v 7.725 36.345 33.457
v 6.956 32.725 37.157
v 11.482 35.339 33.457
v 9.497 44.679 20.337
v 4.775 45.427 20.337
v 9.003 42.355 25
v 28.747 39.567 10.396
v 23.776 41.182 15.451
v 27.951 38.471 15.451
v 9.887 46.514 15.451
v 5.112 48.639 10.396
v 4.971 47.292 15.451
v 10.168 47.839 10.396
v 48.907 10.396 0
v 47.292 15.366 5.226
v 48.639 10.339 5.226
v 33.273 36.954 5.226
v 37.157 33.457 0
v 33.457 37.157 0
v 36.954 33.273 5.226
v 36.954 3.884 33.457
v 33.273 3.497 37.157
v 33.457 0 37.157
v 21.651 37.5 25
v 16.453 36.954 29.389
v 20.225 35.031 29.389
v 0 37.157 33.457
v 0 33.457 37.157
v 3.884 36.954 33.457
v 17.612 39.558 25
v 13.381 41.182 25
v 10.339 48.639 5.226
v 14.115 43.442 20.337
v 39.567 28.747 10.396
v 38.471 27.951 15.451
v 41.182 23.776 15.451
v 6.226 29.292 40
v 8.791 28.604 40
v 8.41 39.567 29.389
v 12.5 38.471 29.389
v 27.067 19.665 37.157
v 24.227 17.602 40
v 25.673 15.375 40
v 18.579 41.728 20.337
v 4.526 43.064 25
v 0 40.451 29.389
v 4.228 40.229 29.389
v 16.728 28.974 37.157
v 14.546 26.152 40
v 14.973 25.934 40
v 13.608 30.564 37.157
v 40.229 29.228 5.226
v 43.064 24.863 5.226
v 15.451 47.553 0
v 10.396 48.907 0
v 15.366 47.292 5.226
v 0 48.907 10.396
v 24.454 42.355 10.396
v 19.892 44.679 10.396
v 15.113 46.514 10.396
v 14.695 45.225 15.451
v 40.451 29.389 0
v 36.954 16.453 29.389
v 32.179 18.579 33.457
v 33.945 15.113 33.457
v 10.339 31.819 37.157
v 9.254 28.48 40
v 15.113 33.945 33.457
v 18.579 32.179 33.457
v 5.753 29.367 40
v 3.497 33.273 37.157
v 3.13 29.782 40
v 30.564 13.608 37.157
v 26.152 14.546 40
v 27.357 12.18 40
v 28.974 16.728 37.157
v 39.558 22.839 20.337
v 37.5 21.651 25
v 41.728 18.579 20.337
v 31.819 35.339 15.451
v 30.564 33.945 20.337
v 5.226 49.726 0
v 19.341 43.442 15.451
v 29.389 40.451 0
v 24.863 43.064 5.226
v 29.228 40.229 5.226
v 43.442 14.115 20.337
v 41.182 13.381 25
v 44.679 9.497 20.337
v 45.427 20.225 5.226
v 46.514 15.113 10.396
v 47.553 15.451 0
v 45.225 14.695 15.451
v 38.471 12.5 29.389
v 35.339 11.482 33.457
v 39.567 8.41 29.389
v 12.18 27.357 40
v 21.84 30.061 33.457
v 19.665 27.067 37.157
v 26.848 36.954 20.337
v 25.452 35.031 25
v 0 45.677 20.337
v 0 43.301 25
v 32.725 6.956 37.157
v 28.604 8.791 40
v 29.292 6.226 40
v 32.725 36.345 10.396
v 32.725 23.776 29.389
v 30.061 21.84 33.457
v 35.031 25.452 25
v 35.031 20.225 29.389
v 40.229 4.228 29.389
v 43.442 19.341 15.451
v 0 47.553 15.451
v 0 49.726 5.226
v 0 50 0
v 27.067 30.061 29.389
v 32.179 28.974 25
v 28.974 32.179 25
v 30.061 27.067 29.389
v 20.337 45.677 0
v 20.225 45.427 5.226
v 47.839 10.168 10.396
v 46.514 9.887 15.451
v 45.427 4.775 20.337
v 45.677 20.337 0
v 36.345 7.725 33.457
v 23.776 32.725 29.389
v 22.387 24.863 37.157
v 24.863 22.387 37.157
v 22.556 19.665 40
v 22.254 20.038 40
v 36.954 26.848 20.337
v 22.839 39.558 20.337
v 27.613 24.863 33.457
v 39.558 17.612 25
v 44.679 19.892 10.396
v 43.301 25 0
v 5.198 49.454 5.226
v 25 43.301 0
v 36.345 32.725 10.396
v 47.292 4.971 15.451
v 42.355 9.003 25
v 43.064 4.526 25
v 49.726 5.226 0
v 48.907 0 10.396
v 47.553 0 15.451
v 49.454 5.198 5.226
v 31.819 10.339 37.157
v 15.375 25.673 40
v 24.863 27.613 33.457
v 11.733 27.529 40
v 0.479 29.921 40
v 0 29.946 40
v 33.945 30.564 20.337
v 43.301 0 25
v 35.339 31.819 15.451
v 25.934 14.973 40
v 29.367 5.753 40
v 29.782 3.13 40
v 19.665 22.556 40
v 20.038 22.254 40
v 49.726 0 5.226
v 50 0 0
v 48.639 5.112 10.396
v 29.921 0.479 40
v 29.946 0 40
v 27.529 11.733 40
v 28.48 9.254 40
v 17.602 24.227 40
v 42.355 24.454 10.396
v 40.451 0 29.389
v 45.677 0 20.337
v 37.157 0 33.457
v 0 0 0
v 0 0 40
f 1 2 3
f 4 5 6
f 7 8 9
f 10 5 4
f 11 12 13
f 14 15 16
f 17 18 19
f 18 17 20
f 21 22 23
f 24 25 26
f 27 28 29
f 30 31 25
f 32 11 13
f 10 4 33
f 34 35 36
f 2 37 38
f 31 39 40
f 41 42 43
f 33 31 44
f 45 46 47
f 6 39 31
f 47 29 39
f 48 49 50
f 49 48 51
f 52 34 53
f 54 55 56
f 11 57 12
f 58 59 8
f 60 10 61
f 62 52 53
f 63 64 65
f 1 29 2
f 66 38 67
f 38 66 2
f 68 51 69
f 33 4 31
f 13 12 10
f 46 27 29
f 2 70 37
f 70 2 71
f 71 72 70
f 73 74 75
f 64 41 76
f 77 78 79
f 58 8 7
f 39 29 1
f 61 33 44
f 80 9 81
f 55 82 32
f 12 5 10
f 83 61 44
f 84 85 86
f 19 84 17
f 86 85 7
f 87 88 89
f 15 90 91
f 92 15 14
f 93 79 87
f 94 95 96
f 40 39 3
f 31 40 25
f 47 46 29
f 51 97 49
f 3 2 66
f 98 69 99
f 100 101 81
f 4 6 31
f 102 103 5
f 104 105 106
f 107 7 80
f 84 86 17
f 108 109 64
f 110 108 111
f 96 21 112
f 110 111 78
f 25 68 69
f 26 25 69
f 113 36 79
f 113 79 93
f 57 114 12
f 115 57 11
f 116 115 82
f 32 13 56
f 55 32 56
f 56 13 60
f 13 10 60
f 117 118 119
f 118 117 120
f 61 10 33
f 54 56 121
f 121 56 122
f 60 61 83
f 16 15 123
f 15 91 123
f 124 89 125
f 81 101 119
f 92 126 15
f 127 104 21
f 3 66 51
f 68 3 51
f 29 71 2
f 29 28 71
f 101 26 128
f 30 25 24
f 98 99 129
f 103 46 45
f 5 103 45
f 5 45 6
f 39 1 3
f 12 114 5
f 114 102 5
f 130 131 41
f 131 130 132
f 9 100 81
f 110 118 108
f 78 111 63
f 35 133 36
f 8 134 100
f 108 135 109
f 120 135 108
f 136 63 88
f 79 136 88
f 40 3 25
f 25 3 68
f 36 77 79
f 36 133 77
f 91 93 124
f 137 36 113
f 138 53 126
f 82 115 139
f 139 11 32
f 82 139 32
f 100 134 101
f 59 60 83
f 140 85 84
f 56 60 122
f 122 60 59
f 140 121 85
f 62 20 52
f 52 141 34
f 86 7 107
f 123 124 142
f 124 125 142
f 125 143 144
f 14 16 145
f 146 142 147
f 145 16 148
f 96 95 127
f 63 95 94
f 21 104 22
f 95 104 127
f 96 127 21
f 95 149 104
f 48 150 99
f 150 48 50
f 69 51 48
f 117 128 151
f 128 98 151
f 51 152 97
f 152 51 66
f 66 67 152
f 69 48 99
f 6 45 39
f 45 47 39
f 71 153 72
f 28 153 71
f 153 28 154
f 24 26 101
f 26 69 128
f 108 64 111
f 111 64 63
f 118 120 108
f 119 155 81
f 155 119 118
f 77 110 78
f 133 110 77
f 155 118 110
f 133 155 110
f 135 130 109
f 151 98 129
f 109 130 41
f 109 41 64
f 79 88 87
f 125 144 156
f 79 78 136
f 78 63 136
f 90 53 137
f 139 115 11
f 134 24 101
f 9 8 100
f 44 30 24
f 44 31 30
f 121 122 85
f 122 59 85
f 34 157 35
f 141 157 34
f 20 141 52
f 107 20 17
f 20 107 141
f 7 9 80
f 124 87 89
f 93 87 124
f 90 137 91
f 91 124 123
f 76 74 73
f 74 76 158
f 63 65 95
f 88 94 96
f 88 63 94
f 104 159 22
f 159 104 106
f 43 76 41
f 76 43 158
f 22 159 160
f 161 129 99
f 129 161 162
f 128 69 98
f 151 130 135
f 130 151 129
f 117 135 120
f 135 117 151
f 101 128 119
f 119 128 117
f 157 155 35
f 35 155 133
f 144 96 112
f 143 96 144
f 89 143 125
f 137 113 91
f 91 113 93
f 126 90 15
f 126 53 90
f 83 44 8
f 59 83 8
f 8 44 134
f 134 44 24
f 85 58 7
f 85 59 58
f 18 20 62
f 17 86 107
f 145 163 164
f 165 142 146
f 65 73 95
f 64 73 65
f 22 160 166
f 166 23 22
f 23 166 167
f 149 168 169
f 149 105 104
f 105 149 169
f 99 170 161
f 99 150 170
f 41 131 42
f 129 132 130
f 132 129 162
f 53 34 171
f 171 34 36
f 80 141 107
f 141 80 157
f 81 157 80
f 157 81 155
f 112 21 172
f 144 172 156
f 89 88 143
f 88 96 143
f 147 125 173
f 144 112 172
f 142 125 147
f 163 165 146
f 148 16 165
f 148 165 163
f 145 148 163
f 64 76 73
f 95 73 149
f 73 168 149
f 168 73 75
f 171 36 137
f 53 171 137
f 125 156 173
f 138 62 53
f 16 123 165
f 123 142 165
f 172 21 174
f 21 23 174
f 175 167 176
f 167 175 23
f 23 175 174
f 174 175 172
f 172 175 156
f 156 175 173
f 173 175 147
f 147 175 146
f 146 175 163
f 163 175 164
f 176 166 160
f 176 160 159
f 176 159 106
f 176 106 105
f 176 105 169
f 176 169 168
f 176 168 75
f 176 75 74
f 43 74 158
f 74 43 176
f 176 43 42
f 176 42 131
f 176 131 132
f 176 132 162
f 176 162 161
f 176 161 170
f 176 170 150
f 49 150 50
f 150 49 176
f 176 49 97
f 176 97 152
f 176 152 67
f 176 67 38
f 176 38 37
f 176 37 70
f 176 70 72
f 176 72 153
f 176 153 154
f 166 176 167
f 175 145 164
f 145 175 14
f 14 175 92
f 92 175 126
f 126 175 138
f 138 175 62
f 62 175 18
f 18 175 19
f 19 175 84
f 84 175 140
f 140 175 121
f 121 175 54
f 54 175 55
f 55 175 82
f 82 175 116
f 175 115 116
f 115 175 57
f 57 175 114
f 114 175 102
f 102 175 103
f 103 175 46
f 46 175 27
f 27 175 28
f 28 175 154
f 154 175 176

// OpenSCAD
// file: ../utils/core/clip.scad
//
// NopSCADlib Copyright Chris Palmer 2018
// nop.head@gmail.com
// hydraraptor.blogspot.com
//
// This file is part of NopSCADlib.
//
// NopSCADlib is free software: you can redistribute it and/or modify it under the terms of the
// GNU General Public License as published by the Free Software Foundation, either version 3 of
// the License, or (at your option) any later version.
//
// NopSCADlib is distributed in the hope that it will be useful, but WITHOUT ANY WARRANTY;
// without even the implied warranty of MERCHANTABILITY or FITNESS FOR A PARTICULAR PURPOSE.
// See the GNU General Public License for more details.
//
// You should have received a copy of the GNU General Public License along with NopSCADlib.
// If not, see <https://www.gnu.org/licenses/>.
//

//
//! Construct arbirarily large box to partition 3D space and clip objects, useful for creating cross sections to see the inside when debugging.
//!
//! Original version by Doug Moen on the OpenSCAD forum
//
//
module box(xmin, ymin, zmin, xmax, ymax, zmax) //! Construct a box given its bounds
    polyhedron(
        [[xmin, ymin, zmin],  // 0
         [xmin, ymin, zmax],  // 1
         [xmin, ymax, zmin],  // 2
         [xmin, ymax, zmax],  // 3
         [xmax, ymin, zmin],  // 4
         [xmax, ymin, zmax],  // 5
         [xmax, ymax, zmin],  // 6
         [xmax, ymax, zmax]], // 7
        [[7,5,1,3],  // top
         [2,0,4,6],  // bottom
         [5,4,0,1],  // front
         [3,2,6,7],  // back
         [5,7,6,4],  // right
         [0,2,3,1]]  // left
    );

module clip(xmin = -inf, ymin = -inf, zmin = -inf, xmax = inf, ymax = inf, zmax = inf) //! Clip child to specified boundaries
    render() intersection() {
        children();

        box(xmin, ymin, zmin, xmax, ymax, zmax);
    }
// file: ../utils/core/rounded_rectangle.scad
//
// NopSCADlib Copyright Chris Palmer 2018
// nop.head@gmail.com
// hydraraptor.blogspot.com
//
// This file is part of NopSCADlib.
//
// NopSCADlib is free software: you can redistribute it and/or modify it under the terms of the
// GNU General Public License as published by the Free Software Foundation, either version 3 of
// the License, or (at your option) any later version.
//
// NopSCADlib is distributed in the hope that it will be useful, but WITHOUT ANY WARRANTY;
// without even the implied warranty of MERCHANTABILITY or FITNESS FOR A PARTICULAR PURPOSE.
// See the GNU General Public License for more details.
//
// You should have received a copy of the GNU General Public License along with NopSCADlib.
// If not, see <https://www.gnu.org/licenses/>.
//

//
//! Rectangle with rounded corners.
//
module rounded_square(size, r, center = true) //! Like ```square()``` but with with rounded corners
{
    $fn = r2sides4n(r);
    offset(r) offset(-r) square(size, center = center);
}

module rounded_rectangle(size, r, center = true, xy_center = true) //! Like ```cube()``` but corners rounded in XY plane and separate centre options for xy and z.
{
    linear_extrude(height = size[2], center = center)
        rounded_square([size[0], size[1]], r, xy_center);
}
// file: ../utils/core/teardrops.scad
//
// NopSCADlib Copyright Chris Palmer 2018
// nop.head@gmail.com
// hydraraptor.blogspot.com
//
// This file is part of NopSCADlib.
//
// NopSCADlib is free software: you can redistribute it and/or modify it under the terms of the
// GNU General Public License as published by the Free Software Foundation, either version 3 of
// the License, or (at your option) any later version.
//
// NopSCADlib is distributed in the hope that it will be useful, but WITHOUT ANY WARRANTY;
// without even the implied warranty of MERCHANTABILITY or FITNESS FOR A PARTICULAR PURPOSE.
// See the GNU General Public License for more details.
//
// You should have received a copy of the GNU General Public License along with NopSCADlib.
// If not, see <https://www.gnu.org/licenses/>.
//

//
//! For making horizontal holes that don't need support material.
//! Small holes can get away without it, but they print better with truncated teardrops.
//
module teardrop(h, r, center = true, truncate = true) //! For making horizontal holes that don't need support material, set ```truncate = false``` to make traditional RepRap teardrops that don't even need bridging
    render(convexity = 5)
        extrude_if(h, center)
           hull() {
                circle4n(r);

                if(truncate)
                    translate([0, r / 2])
                        square([2 * r * (sqrt(2) - 1), r], center = true);
                else
                    polygon([[0, 0], [eps, 0], [0, r * sqrt(2)]]);
            }

module teardrop_plus(h, r, center = true, truncate = true) //! Slightly bigger teardrop to allow for the 3D printing staircase effect
    teardrop(h, r + layer_height / 4, center, truncate);

module tearslot(h, r, w, center = true) //! A horizontal slot that doesn't need support material
    extrude_if(h, center)
        hull() {
            translate([-w/2,0,0]) teardrop(r = r, h = 0);
            translate([ w/2,0,0]) teardrop(r = r, h = 0);
        }

module vertical_tearslot(h, r, l, center = true) //! A vertical slot that doesn't need support material
    extrude_if(h, center)
        hull() {
            translate([0,  l / 2]) teardrop(0, r, true);
            translate([0, -l / 2])
                circle4n(r);
        }
// file: ../utils/core/polyholes.scad
//
// NopSCADlib Copyright Chris Palmer 2018
// nop.head@gmail.com
// hydraraptor.blogspot.com
//
// This file is part of NopSCADlib.
//
// NopSCADlib is free software: you can redistribute it and/or modify it under the terms of the
// GNU General Public License as published by the Free Software Foundation, either version 3 of
// the License, or (at your option) any later version.
//
// NopSCADlib is distributed in the hope that it will be useful, but WITHOUT ANY WARRANTY;
// without even the implied warranty of MERCHANTABILITY or FITNESS FOR A PARTICULAR PURPOSE.
// See the GNU General Public License for more details.
//
// You should have received a copy of the GNU General Public License along with NopSCADlib.
// If not, see <https://www.gnu.org/licenses/>.
//

//
//! A method of making 3D printed holes come out the right size regardless of the printer, providing
//! it gets the linear dimensions right. See <https://hydraraptor.blogspot.com/2011/02/polyholes.html>
//!
//! The module provides `poly_circle()`, `poly_cylinder()` and `poly_ring()` that is useful for making printed washers and pillars.
//
function sides(r) = max(round(4 * r), 3); //! Optimium number of sides for specified radius
function corrected_radius(r, n = 0)   = r / cos(180 / (n ? n : sides(r))); //! Adjusted radius to make flats lie on the circle
function corrected_diameter(d, n = 0) = d / cos(180 / (n ? n : sides(d / 2))); //! Adjusted diameter to make flats lie on the circle

module poly_circle(r, sides = 0) { //! Make a circle adjusted to print the correct size
    n = sides ? sides : sides(r);
    circle(r = corrected_radius(r,n), $fn = n);
}

module poly_cylinder(r, h, center = false, sides = 0) //! Make a cylinder adjusted to print the correct size
    extrude_if(h, center)
        poly_circle(r, sides);

module poly_ring(or, ir) { //! Make a 2D ring adjusted to have the correct internal radius
    cir = corrected_radius(ir);
    filaments = floor((or - cir) / extrusion_width);
    if(filaments > 3)
        difference() {
            circle(or);

            poly_circle(ir);
        }
    else
        if(filaments >= 2)
            difference() {
                offset(or - cir)
                    poly_circle(ir);

                poly_circle(ir);
            }
            else
                difference() {
                    poly_circle(or);

                    offset(-squeezed_wall)
                        poly_circle(or);
                }
}

module drill(r, h = 100) //! Make a cylinder for drilling holes suitable for CNC routing, set h = 0 for circle
    extrude_if(h)
        circle(r = corrected_radius(r, r2sides(r)));
//
// Horizontal slot
//
module slot(r, l, h = 100) //! Make a horizontal slot suitable for CNC routing, set h = 0 for 2D version
    extrude_if(h)
        hull() {
            translate([l / 2,0])
                drill(r, 0);

            translate([-l / 2,0])
                drill(r, 0);
        }
// file: ../utils/core/bom.scad
//
// NopSCADlib Copyright Chris Palmer 2018
// nop.head@gmail.com
// hydraraptor.blogspot.com
//
// This file is part of NopSCADlib.
//
// NopSCADlib is free software: you can redistribute it and/or modify it under the terms of the
// GNU General Public License as published by the Free Software Foundation, either version 3 of
// the License, or (at your option) any later version.
//
// NopSCADlib is distributed in the hope that it will be useful, but WITHOUT ANY WARRANTY;
// without even the implied warranty of MERCHANTABILITY or FITNESS FOR A PARTICULAR PURPOSE.
// See the GNU General Public License for more details.
//
// You should have received a copy of the GNU General Public License along with NopSCADlib.
// If not, see <https://www.gnu.org/licenses/>.
//

//
//! Bill Of Materials generation via echo and the ```bom.py``` script. Also handles exploded assembly views and posing. Assembly instructions can precede the module
//! definition that makes the assembly.
//!
//! The example below shows how to define a vitamin and incorporate it into an assembly with sub-assemblies and make an exploded view. The resulting flat BOM is shown but
//! heirachical BOMs are also generated for real projects.
//
function bom_mode(n = 1) = $_bom >= n && (is_undef($on_bom) || $on_bom);  //! Current BOM mode, 0 = none, 1 = printed and routed parts and assemblies, 2 includes vitamins as well
function exploded() = is_undef($exploded_parent) ? $exploded : 0;   //! Returns the value of ```$exploded``` if it is defined, else ```0```
function show_supports() = !$preview || exploded();                 //! True if printed support material should be shown

module no_explode() let($exploded_parent = true) children();        //! Prevent children being exploded
module no_pose() let($posed = true) children();                     //! Force children not to be posed even if parent is

module explode(d, explode_children = false, offset = [0,0,0]) {     //! Explode children by specified Z distance or vector ```d```, option to explode grand children
    v = is_list(d) ? d : [0, 0, d];
    o = is_list(offset) ? offset : [0, 0, offset];
    if($exploded && is_undef($exploded_parent)) {
        translate(o)                                                // Draw the line first in case the child is transparent
            hull() {
                sphere(0.2);

                translate(v * $exploded)
                    sphere(0.2);
            }

        translate(v * $exploded)
            let($exploded_parent = explode_children ? undef : true)
                children();
    }
    else
        children();
}

module pose(a = [55, 0, 25], t = [0, 0, 0], exploded = undef)       //! Pose an STL or assembly for rendering to png by specifying rotation ```a``` and translation ```t```, ```exploded = true for``` just the exploded view or ```false``` for unexploded only.
    if(is_undef($pose) || !is_undef($posed) || (!is_undef(exploded) && exploded != !!exploded()))
        children();
    else
        let($posed = true) // only pose the top level
            rotate([55, 0, 25])
                rotate([-a.x, 0, 0])
                    rotate([0, -a.y, 0])
                        rotate([0, 0, -a.z])
                            translate(-t)
                                children();


module assembly(name) {                 //! Name an assembly that will appear on the BOM, there needs to a module named ```<name>_assembly``` to make it
    if(bom_mode())
        echo(str("~", name, "_assembly{"));

    no_pose()
        if(is_undef($child_assembly))
            let($child_assembly = true)
                children();
        else
            no_explode()
                children();

    if(bom_mode())
        echo(str("~}", name, "_assembly"));
}

module stl(name) {                      //! Name an stl that will appear on the BOM, there needs to a module named ```<name>_stl``` to make it
    if(bom_mode())
        echo(str("~", name, ".stl"));
}

module dxf(name) {                      //! Name a dxf that will appear on the BOM, there needs to a module named ```<name>_dxf``` to make it
    if(bom_mode())
        echo(str("~", name, ".dxf"));
}

function value_string(value) = is_string(value) ? str("\"", value, "\"") : str(value); //! Convert ```value``` to a string or quote it if it is already a string

function arg(value, default, name = "") =   //! Create string for arg if not default, helper for ```vitamin()```
    value == default ? ""
                     : name ? str(", ", name, " = ", value_string(value))
                            : str(", ", value_string(value));

module vitamin(description) {                //! Describe a vitamin for the BOM entry and precede it with a module call that creates it, eg. "wigit(42): Type 42 widget"
    if(bom_mode(2))
        echo(str("~", description, !is_undef($hidden) ? " - not shown" : ""));
}

module not_on_bom(on = false)               //! Specify the following child parts are not on the BOM, for example when they are on a PCB that comes assembled
    let($on_bom = on)
        children();

module hidden()                             //! Make item invisible, except on the BOM
    scale(1 / sqr(1024))
        let($hidden = true)
            children();
// file: ../utils/core/sphere.scad
//
// NopSCADlib Copyright Chris Palmer 2018
// nop.head@gmail.com
// hydraraptor.blogspot.com
//
// This file is part of NopSCADlib.
//
// NopSCADlib is free software: you can redistribute it and/or modify it under the terms of the
// GNU General Public License as published by the Free Software Foundation, either version 3 of
// the License, or (at your option) any later version.
//
// NopSCADlib is distributed in the hope that it will be useful, but WITHOUT ANY WARRANTY;
// without even the implied warranty of MERCHANTABILITY or FITNESS FOR A PARTICULAR PURPOSE.
// See the GNU General Public License for more details.
//
// You should have received a copy of the GNU General Public License along with NopSCADlib.
// If not, see <https://www.gnu.org/licenses/>.
//

//! Redefines `sphere()` to always have a vertex on all six half axes I.e. vertices at the poles and the equator and `$fn` a multiple of four.
//! This ensures `hull` and `minkowski` results have the correct dimensions when spheres are placed at the corners.

module sphere(r = 1, d = undef) {                   //! Override ```sphere``` so that has vertices on all three axes. Has the advantage of giving correct dimensions when hulled
    R = is_undef(d) ? r : d / 2;
    rotate_extrude($fn = r2sides4n(R))
        rotate(-90)
            semi_circle(R);
}
// file: ../utils/core/global.scad
//
// NopSCADlib Copyright Chris Palmer 2018
// nop.head@gmail.com
// hydraraptor.blogspot.com
//
// This file is part of NopSCADlib.
//
// NopSCADlib is free software: you can redistribute it and/or modify it under the terms of the
// GNU General Public License as published by the Free Software Foundation, either version 3 of
// the License, or (at your option) any later version.
//
// NopSCADlib is distributed in the hope that it will be useful, but WITHOUT ANY WARRANTY;
// without even the implied warranty of MERCHANTABILITY or FITNESS FOR A PARTICULAR PURPOSE.
// See the GNU General Public License for more details.
//
// You should have received a copy of the GNU General Public License along with NopSCADlib.
// If not, see <https://www.gnu.org/licenses/>.
//

//
//! Global constants, functions and modules. This file is used directly or indirectly in every scad file.
//
include <../../global_defs.scad>

function sqr(x) = x * x;                                                            //! Returns the square of ```x```
function inch(x) = x * 25.4;                                                        //! Inch to mm conversion
function echoit(x) = echo(x) x;                                                     //! Echo expression and return it, useful for debugging
function in(list, x) = !!len([for(v = list) if(v == x) true]);                      //! Returns true if ```x``` is an element in the ```list```
function Len(x) = is_list(x) ? len(x) : 0;                                          //! Returns the length of a list or 0 if ```x``` is not a list
function r2sides(r) = $fn ? $fn : ceil(max(min(360/ $fa, r * 2 * PI / $fs), 5));    //! Replicates the OpenSCAD logic to calculate the number of sides from the radius
function r2sides4n(r) = floor((r2sides(r) + 3) / 4) * 4;                            //! Round up the number of sides to a multiple of 4 to ensure points land on all axes

module translate_z(z) translate([0, 0, z]) children();                              //! Shortcut for Z only translations
module vflip() rotate([180, 0, 0]) children();                                      //! Invert children by doing a 180 flip around the X axis
module ellipse(xr, yr) scale([1, yr / xr]) circle4n(xr);                            //! Draw an ellipse

module extrude_if(h, center = true)                 //! Extrudes 2D object to 3D when ```h``` is nonzero, otherwise leaves it 2D
    if(h)
        linear_extrude(height = h, center = center) // 3D
            children();
    else
        children();                                 // 2D

module circle4n(r, d = undef) {                     //! Circle with multiple of 4 vertices
    R = is_undef(d) ? r : d / 2;
    circle(R, $fn = r2sides4n(R));
}

module semi_circle(r, d = undef)                    //! A semi circle in the positive Y domain
    intersection() {
        R = is_undef(d) ? r : d / 2;
        circle4n(R);

        sq = R + 1;
        translate([-sq, 0])
            square([2 * sq, sq]);
    }

include <sphere.scad>
include <bom.scad>
include <polyholes.scad>
include <teardrops.scad>
include <rounded_rectangle.scad>
include <clip.scad>
// file: ../global_defs.scad
//
// NopSCADlib Copyright Chris Palmer 2018
// nop.head@gmail.com
// hydraraptor.blogspot.com
//
// This file is part of NopSCADlib.
//
// NopSCADlib is free software: you can redistribute it and/or modify it under the terms of the
// GNU General Public License as published by the Free Software Foundation, either version 3 of
// the License, or (at your option) any later version.
//
// NopSCADlib is distributed in the hope that it will be useful, but WITHOUT ANY WARRANTY;
// without even the implied warranty of MERCHANTABILITY or FITNESS FOR A PARTICULAR PURPOSE.
// See the GNU General Public License for more details.
//
// You should have received a copy of the GNU General Public License along with NopSCADlib.
// If not, see <https://www.gnu.org/licenses/>.
//

//
// This file included directly or indirectly in every scad file.
//
// This scheme allows the following:
//  bom defaults to 0
//  Setting $bom on the command line or in the main file before including lib.scad overrides it everywhere.
//  Setting $bom after including lib overrides bom in the libs but not in the local file.
//  Setting $_bom in the local file overrides it in the local file but not in the libs.
//
//function is_undef(x) = x == undef;

$_bom           = is_undef($bom)             ? 0      : $bom;             // 0 no bom, 1 assemblies and stls, 2 vitamins as well
$exploded       = is_undef($explode)         ? 0      : $explode;         // 1 for exploded view
layer_height    = is_undef($layer_height)    ? 0.25   : $layer_height;    // layer heigth when printing
extrusion_width = is_undef($extrusion_width) ? 0.5    : $extrusion_width; // filament width when printing
nozzle          = is_undef($nozzle)          ? 0.45   : $nozzle;          // 3D printer nozzle
cnc_bit_r       = is_undef($cnc_bit_r)       ? 1.2    : $cnc_bit_r;       // miniumum tool radius when milling 2D objects
pp1_colour      = is_undef($pp1_colour)      ? "lime" : $pp1_colour;      // printed part colour 1
pp2_colour      = is_undef($pp2_colour)      ? "red"  : $pp2_colour;      // printed part colour 2
pp3_colour      = is_undef($pp3_colour)      ? "blue" : $pp3_colour;      // printed part colour 3
pp4_colour      = is_undef($pp4_colour)      ? "darkorange" : $pp4_colour;// printed part colour 4
show_rays       = is_undef($show_rays)       ? false  : $show_rays;       // show camera sight lines and light direction

// Minimum wall is about two filaments wide but we extrude it closer to get better bonding
squeezed_wall = $preview ? 2 * extrusion_width - layer_height * (1 - PI / 4)
                         : extrusion_width - layer_height / 2 + nozzle / 2 + extrusion_width / 2;

inf = 1e10;      // very big
eps = 1/128;     // small fudge factor to stop CSG barfing on coincident faces.
$fa = 6;
$fs = extrusion_width / 2;

function round_to_layer(z) = ceil(z / layer_height) * layer_height;
// Some additional named colors
grey20                          = [0.2, 0.2, 0.2];
grey30                          = [0.3, 0.3, 0.3];
grey40                          = [0.4, 0.4, 0.4];
grey50                          = [0.5, 0.5, 0.5];
grey60                          = [0.6, 0.6, 0.6];
grey70                          = [0.7, 0.7, 0.7];
grey80                          = [0.8, 0.8, 0.8];
grey90                          = [0.9, 0.9, 0.9];
brass                           = "gold";

/*
 * Enums
 */
//
// Screws
//
hs_cap    = 0;
hs_pan    = 1;
hs_cs     = 2;     // counter sunk
hs_hex    = 3;
hs_grub   = 4;     // pulley set screw
hs_cs_cap = 5;
hs_dome   = 6;
//
// Hot end descriptions
//
jhead   = 1;
e3d     = 2;
//
// Face enumeration
//
f_bottom = 0;
f_top    = 1;
f_left   = 2;
f_right  = 3;
f_front  = 4;
f_back   = 5;
// file: ../core.scad
//
// NopSCADlib Copyright Chris Palmer 2018
// nop.head@gmail.com
// hydraraptor.blogspot.com
//
// This file is part of NopSCADlib.
//
// NopSCADlib is free software: you can redistribute it and/or modify it under the terms of the
// GNU General Public License as published by the Free Software Foundation, either version 3 of
// the License, or (at your option) any later version.
//
// NopSCADlib is distributed in the hope that it will be useful, but WITHOUT ANY WARRANTY;
// without even the implied warranty of MERCHANTABILITY or FITNESS FOR A PARTICULAR PURPOSE.
// See the GNU General Public License for more details.
//
// You should have received a copy of the GNU General Public License along with NopSCADlib.
// If not, see <https://www.gnu.org/licenses/>.
//

//
// Include this file to use the library
//
include <global_defs.scad>
//
// Global functions and modules
//
use <utils/core/global.scad>
// main file
//
// NopSCADlib Copyright Chris Palmer 2018
// nop.head@gmail.com
// hydraraptor.blogspot.com
//
// This file is part of NopSCADlib.
//
// NopSCADlib is free software: you can redistribute it and/or modify it under the terms of the
// GNU General Public License as published by the Free Software Foundation, either version 3 of
// the License, or (at your option) any later version.
//
// NopSCADlib is distributed in the hope that it will be useful, but WITHOUT ANY WARRANTY;
// without even the implied warranty of MERCHANTABILITY or FITNESS FOR A PARTICULAR PURPOSE.
// See the GNU General Public License for more details.
//
// You should have received a copy of the GNU General Public License along with NopSCADlib.
// If not, see <https://www.gnu.org/licenses/>.
//

include <../core.scad>

module clips() {
    clip(xmin = 0, ymin = 0, zmin = 0, zmax = 40) sphere(50);
}

clips();
